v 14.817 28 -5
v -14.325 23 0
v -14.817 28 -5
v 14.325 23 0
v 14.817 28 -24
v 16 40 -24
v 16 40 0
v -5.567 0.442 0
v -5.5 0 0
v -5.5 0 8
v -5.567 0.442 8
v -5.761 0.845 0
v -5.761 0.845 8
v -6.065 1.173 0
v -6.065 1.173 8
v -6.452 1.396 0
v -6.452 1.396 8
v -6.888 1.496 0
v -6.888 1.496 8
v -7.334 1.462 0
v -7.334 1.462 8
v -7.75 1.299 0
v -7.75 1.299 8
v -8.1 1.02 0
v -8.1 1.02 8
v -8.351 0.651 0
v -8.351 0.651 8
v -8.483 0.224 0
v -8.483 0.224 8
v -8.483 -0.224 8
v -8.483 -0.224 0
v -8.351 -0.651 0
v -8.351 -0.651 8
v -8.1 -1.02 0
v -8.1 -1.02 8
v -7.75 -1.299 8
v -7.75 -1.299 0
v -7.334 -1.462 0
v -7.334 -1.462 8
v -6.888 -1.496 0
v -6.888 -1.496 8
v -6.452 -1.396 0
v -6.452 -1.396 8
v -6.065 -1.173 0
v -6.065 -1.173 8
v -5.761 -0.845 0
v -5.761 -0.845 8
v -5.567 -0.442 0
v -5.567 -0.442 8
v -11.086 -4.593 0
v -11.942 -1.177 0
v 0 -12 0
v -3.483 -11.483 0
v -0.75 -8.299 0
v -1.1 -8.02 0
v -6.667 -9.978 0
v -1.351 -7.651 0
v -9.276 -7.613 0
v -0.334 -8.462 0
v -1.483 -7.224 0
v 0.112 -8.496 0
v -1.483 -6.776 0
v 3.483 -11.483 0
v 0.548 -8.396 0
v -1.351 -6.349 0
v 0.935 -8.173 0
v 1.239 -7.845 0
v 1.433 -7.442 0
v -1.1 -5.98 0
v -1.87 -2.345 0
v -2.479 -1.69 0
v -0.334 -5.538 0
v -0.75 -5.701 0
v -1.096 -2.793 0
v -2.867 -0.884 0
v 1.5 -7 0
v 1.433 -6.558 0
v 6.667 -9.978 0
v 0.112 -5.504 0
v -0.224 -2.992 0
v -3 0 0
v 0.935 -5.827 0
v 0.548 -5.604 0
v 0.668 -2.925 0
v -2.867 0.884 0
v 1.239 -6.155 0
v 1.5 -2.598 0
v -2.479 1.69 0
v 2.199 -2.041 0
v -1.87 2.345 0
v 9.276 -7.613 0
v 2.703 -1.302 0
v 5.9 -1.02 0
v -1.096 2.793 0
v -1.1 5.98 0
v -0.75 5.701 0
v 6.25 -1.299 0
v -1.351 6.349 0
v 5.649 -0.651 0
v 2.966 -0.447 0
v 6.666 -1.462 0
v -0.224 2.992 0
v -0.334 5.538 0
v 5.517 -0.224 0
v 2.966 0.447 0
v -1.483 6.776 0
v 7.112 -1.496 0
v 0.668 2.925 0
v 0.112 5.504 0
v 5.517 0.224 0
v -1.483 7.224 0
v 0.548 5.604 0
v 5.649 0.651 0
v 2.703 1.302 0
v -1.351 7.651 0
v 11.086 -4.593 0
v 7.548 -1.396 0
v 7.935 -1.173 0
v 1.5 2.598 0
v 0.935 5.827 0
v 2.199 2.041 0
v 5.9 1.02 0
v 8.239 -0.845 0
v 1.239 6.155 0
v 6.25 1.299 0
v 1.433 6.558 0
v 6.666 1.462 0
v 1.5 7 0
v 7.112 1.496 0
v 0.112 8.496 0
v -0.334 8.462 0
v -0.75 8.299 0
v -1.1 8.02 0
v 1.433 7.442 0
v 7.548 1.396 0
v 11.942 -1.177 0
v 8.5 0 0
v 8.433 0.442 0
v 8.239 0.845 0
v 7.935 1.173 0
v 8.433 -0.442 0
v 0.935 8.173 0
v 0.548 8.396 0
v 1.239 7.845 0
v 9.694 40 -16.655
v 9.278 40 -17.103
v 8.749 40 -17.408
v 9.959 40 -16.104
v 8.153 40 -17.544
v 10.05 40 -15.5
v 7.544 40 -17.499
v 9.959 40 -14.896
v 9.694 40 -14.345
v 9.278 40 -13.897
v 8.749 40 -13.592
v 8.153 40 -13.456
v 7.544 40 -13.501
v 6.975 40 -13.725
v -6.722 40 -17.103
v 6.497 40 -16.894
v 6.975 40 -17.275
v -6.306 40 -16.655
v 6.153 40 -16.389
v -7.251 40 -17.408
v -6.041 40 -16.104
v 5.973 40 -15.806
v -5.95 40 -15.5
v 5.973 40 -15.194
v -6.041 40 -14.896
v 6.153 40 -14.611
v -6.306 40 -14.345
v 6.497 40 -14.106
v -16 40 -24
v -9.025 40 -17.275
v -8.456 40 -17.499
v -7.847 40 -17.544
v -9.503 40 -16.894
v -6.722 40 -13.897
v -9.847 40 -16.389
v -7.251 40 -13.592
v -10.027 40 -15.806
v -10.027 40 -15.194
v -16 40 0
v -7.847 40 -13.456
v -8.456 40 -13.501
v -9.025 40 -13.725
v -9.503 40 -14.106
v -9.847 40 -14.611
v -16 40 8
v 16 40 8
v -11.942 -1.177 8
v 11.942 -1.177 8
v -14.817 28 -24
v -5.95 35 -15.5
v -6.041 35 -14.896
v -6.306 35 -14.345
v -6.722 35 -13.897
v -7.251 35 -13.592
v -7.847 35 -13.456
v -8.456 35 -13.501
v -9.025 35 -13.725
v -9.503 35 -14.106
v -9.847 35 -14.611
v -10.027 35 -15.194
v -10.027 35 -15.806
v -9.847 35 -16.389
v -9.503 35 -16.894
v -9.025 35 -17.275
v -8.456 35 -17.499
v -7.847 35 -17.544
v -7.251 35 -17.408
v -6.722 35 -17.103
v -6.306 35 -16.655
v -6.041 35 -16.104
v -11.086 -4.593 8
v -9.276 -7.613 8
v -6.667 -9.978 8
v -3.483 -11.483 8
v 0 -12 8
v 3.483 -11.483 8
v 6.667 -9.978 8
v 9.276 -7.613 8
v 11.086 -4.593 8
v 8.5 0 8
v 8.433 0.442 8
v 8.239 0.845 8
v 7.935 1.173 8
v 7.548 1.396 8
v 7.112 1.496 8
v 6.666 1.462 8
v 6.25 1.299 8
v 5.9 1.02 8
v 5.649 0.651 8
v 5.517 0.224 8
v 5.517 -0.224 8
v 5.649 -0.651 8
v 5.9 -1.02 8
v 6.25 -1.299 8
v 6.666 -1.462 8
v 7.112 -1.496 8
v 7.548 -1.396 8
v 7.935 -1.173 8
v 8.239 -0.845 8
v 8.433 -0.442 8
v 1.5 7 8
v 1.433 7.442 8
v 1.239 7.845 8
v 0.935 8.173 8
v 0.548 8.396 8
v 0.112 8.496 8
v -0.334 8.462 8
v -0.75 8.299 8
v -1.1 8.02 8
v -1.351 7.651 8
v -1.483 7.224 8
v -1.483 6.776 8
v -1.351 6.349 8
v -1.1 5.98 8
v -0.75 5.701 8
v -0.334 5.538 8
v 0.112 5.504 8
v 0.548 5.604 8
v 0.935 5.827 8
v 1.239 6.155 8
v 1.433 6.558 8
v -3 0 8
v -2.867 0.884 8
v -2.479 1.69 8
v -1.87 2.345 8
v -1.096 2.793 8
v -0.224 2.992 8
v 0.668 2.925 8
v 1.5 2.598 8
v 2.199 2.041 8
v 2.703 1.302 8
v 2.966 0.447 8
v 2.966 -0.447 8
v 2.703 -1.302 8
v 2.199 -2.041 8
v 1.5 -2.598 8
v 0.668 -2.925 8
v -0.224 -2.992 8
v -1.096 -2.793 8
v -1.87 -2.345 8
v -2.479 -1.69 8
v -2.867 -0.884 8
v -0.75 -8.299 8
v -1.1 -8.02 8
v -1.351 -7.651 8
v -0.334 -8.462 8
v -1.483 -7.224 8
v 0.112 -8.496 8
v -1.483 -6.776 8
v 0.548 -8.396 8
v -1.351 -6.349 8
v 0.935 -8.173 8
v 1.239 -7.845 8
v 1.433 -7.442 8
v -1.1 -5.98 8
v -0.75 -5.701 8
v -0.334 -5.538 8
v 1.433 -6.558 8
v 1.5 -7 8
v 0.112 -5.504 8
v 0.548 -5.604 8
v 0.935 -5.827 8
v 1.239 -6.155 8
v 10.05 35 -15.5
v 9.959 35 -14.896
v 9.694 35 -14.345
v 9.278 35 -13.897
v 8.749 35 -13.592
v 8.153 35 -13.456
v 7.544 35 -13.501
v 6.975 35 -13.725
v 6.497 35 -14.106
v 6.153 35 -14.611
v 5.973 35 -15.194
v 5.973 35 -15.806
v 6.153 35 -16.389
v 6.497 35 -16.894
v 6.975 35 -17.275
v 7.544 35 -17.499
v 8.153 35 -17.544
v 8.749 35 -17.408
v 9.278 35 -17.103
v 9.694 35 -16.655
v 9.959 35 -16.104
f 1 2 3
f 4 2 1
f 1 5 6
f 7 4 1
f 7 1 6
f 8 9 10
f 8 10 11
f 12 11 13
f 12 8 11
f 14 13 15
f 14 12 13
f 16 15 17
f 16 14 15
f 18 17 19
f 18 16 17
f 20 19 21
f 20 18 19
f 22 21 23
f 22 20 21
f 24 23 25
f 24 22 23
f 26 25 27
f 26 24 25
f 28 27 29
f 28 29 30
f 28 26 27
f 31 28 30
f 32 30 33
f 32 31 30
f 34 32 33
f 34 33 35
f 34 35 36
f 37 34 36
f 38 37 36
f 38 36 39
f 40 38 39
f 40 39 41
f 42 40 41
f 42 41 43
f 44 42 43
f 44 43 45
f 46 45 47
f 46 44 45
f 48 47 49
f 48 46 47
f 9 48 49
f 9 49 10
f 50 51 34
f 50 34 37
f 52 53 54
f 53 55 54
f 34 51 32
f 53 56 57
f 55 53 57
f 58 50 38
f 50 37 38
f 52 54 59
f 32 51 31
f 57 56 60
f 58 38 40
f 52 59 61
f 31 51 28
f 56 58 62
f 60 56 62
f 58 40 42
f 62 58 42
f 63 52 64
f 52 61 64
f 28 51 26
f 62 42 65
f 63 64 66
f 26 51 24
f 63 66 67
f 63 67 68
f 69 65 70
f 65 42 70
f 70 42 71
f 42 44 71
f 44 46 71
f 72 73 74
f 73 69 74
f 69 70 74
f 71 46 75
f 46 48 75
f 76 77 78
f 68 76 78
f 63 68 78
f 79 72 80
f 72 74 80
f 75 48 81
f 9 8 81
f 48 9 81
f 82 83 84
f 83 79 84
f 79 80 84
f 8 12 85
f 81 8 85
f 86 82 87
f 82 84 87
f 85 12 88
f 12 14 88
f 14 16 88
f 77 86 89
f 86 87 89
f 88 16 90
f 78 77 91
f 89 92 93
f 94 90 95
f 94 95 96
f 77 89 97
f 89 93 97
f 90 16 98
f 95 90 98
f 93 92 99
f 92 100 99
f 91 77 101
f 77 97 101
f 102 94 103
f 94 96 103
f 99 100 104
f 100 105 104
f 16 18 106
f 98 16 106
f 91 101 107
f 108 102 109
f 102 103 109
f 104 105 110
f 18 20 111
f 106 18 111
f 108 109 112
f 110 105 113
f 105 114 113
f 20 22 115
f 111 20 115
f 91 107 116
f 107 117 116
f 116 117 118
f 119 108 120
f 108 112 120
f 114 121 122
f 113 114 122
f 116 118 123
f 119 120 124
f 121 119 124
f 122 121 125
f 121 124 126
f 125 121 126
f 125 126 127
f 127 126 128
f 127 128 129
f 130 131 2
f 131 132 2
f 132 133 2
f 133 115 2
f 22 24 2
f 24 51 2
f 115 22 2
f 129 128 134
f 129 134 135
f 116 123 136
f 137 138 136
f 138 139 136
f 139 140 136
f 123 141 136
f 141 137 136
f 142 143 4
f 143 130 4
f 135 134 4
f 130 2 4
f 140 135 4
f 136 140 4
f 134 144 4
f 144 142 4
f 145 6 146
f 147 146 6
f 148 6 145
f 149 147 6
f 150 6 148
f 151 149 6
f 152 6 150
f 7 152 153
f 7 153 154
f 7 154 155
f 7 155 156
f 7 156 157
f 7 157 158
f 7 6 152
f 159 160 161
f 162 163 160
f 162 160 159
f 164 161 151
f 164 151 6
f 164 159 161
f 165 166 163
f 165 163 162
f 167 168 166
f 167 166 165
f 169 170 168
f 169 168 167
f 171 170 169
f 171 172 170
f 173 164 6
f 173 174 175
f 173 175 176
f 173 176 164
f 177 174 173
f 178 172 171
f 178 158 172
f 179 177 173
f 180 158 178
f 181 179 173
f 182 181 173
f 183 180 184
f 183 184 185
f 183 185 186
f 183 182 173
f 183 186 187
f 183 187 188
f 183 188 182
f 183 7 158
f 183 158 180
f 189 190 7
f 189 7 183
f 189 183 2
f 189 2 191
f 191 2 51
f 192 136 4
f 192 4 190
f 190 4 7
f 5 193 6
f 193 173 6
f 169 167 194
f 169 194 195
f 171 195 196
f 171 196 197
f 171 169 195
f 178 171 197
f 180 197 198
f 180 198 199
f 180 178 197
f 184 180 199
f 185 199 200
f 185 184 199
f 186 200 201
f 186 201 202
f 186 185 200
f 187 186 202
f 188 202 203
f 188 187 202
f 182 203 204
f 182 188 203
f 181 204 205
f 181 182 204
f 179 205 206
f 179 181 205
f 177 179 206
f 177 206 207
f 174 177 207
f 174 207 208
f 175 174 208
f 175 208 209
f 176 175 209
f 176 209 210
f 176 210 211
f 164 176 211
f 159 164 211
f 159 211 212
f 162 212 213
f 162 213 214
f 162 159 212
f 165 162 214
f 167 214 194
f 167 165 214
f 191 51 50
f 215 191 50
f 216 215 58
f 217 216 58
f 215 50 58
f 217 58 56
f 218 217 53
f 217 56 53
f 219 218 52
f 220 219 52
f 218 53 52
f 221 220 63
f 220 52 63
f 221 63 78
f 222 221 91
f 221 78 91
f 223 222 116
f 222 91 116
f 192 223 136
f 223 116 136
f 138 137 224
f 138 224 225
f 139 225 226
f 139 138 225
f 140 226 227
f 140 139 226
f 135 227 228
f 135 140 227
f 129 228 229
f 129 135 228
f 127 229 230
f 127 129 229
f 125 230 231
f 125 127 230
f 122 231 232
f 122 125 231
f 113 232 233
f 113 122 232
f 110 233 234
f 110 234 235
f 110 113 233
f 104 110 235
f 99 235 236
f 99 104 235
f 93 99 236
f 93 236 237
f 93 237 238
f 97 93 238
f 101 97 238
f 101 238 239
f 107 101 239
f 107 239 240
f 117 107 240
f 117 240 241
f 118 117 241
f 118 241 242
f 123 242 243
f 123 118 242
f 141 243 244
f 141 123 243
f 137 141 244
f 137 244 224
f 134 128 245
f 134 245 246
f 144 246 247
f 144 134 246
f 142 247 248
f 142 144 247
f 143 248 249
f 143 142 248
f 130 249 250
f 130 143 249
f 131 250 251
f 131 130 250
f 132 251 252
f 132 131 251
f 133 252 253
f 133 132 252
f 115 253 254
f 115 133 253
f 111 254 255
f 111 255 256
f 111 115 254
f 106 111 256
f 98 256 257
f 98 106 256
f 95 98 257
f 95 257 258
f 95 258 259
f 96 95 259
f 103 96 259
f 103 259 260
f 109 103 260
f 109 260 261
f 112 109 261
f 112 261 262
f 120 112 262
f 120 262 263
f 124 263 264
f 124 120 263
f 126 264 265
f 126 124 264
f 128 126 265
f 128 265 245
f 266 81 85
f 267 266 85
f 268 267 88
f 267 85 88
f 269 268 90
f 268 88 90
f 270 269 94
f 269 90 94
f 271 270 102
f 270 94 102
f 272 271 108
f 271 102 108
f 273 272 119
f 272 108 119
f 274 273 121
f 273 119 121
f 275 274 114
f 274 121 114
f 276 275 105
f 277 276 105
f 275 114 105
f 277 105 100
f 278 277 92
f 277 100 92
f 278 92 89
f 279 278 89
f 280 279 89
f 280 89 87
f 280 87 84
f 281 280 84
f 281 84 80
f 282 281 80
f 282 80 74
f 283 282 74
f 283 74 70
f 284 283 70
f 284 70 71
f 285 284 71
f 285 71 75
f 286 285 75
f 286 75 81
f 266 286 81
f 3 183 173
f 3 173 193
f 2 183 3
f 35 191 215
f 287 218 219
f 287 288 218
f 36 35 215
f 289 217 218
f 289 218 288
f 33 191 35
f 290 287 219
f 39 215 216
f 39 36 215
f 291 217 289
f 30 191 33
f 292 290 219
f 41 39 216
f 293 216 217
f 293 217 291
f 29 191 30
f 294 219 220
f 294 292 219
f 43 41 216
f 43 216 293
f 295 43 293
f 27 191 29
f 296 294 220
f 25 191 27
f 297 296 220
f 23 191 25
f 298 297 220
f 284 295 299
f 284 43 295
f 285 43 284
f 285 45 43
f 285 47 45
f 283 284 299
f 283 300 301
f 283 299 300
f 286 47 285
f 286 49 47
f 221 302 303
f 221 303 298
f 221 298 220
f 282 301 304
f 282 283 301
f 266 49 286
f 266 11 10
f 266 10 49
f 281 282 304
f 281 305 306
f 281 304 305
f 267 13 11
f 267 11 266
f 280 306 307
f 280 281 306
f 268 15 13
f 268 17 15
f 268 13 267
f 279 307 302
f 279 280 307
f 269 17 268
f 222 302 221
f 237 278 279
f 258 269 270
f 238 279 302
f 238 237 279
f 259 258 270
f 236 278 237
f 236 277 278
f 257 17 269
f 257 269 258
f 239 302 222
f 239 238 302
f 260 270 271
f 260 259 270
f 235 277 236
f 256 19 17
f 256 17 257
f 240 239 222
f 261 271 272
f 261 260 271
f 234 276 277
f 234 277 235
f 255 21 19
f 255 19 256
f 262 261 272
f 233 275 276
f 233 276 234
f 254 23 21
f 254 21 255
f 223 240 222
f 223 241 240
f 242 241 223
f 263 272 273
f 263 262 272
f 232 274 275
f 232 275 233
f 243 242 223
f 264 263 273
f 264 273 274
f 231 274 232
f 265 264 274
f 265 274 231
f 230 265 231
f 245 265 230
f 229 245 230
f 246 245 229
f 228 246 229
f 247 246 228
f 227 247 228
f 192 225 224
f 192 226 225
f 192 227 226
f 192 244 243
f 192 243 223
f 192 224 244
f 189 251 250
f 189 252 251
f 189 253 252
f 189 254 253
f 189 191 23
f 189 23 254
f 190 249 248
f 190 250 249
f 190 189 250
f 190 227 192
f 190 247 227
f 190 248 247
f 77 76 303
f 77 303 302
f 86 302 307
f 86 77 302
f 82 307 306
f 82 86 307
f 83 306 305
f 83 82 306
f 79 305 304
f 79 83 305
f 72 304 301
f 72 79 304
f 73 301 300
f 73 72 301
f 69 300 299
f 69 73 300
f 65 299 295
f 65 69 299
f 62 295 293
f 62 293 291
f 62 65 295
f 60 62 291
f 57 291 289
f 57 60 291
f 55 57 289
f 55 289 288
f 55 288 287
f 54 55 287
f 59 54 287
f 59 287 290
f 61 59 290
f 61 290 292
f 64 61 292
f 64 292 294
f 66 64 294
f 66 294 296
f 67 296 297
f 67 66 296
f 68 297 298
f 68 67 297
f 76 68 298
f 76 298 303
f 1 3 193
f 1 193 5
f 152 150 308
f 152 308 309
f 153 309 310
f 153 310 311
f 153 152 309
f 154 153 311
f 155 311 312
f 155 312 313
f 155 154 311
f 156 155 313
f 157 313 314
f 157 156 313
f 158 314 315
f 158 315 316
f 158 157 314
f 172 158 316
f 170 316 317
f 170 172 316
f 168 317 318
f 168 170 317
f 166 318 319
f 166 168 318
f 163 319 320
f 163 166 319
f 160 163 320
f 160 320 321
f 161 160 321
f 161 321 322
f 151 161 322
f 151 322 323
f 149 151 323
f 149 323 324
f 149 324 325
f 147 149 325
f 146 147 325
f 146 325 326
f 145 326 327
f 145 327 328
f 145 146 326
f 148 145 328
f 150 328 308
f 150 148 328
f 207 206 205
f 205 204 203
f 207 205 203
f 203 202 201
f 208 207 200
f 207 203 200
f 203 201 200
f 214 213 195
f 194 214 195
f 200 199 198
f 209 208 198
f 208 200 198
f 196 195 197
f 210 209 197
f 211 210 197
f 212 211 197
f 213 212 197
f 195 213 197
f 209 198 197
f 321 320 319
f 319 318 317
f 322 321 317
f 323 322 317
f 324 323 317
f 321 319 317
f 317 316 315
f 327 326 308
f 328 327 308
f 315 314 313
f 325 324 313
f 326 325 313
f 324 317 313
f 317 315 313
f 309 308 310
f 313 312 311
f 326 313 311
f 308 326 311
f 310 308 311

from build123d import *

# Parameters (mm, degrees)
SKETCH1_R           = 1.5
BOSS_EXTRUDE1_DEPTH = 8
BOSS_EXTRUDE2_DEPTH = 24
CHAMFER1_SIZE       = 5
CUT_EXTRUDE2_REACH  = 10
SKETCH5_R           = 3
SKETCH6_R           = 2.05
CUT_EXTRUDE6_DEPTH  = 5


with BuildPart() as part:
    # Sketch1 → Boss-Extrude1 (new body)
    with BuildSketch(Plane.XY):
        with BuildLine():
            Line((-16, 40), (-11.942152172, -1.176860869))
            ThreePointArc((-11.942152172, -1.176860869), (0, -12), (11.942152172, -1.176860869))
            Line((11.942152172, -1.176860869), (16, 40))
            Line((16, 40), (-16, 40))
        make_face()
        with Locations((7, 0)):
            Circle(SKETCH1_R, mode=Mode.SUBTRACT)
        with Locations((0, 7)):
            Circle(SKETCH1_R, mode=Mode.SUBTRACT)
        with Locations((0, -7)):
            Circle(SKETCH1_R, mode=Mode.SUBTRACT)
        with Locations((-7, 0)):
            Circle(SKETCH1_R, mode=Mode.SUBTRACT)
    extrude(amount=BOSS_EXTRUDE1_DEPTH)

    # Sketch3 → Boss-Extrude2 (add)
    with BuildSketch(Plane(origin=(0, 0, 0), x_dir=(-1, 0, 0), z_dir=(0, 0, -1))):
        Polygon((14.817438413, 28), (-14.817438413, 28), (-16, 40), (16, 40), align=None)
    extrude(amount=BOSS_EXTRUDE2_DEPTH)

    # Chamfer1
    chamfer1_edges = [part.edges().sort_by_distance(p)[0] for p in [
        (0, 28, 0),
    ]]
    chamfer(chamfer1_edges, length=CHAMFER1_SIZE)

    # Sketch5 → Cut-Extrude2 (cut, up to next)
    with BuildSketch(Plane(origin=(0, 0, 0), x_dir=(-1, 0, 0), z_dir=(0, 0, -1)), mode=Mode.PRIVATE) as cut_extrude2_sk1:
        Circle(SKETCH5_R)
    cut_extrude2_tool1 = extrude(cut_extrude2_sk1.sketch, amount=-CUT_EXTRUDE2_REACH, mode=Mode.PRIVATE) & part.part
    add(cut_extrude2_tool1.solids().sort_by_distance((0, 0, 0))[0], mode=Mode.SUBTRACT)

    # Sketch6 → Cut-Extrude6 (cut)
    with BuildSketch(Plane.XZ.offset(-40)):
        with Locations((-8, -15.5)):
            Circle(SKETCH6_R)
        with Locations((8, -15.5)):
            Circle(SKETCH6_R)
    extrude(amount=CUT_EXTRUDE6_DEPTH, mode=Mode.SUBTRACT)


solid = part.part
